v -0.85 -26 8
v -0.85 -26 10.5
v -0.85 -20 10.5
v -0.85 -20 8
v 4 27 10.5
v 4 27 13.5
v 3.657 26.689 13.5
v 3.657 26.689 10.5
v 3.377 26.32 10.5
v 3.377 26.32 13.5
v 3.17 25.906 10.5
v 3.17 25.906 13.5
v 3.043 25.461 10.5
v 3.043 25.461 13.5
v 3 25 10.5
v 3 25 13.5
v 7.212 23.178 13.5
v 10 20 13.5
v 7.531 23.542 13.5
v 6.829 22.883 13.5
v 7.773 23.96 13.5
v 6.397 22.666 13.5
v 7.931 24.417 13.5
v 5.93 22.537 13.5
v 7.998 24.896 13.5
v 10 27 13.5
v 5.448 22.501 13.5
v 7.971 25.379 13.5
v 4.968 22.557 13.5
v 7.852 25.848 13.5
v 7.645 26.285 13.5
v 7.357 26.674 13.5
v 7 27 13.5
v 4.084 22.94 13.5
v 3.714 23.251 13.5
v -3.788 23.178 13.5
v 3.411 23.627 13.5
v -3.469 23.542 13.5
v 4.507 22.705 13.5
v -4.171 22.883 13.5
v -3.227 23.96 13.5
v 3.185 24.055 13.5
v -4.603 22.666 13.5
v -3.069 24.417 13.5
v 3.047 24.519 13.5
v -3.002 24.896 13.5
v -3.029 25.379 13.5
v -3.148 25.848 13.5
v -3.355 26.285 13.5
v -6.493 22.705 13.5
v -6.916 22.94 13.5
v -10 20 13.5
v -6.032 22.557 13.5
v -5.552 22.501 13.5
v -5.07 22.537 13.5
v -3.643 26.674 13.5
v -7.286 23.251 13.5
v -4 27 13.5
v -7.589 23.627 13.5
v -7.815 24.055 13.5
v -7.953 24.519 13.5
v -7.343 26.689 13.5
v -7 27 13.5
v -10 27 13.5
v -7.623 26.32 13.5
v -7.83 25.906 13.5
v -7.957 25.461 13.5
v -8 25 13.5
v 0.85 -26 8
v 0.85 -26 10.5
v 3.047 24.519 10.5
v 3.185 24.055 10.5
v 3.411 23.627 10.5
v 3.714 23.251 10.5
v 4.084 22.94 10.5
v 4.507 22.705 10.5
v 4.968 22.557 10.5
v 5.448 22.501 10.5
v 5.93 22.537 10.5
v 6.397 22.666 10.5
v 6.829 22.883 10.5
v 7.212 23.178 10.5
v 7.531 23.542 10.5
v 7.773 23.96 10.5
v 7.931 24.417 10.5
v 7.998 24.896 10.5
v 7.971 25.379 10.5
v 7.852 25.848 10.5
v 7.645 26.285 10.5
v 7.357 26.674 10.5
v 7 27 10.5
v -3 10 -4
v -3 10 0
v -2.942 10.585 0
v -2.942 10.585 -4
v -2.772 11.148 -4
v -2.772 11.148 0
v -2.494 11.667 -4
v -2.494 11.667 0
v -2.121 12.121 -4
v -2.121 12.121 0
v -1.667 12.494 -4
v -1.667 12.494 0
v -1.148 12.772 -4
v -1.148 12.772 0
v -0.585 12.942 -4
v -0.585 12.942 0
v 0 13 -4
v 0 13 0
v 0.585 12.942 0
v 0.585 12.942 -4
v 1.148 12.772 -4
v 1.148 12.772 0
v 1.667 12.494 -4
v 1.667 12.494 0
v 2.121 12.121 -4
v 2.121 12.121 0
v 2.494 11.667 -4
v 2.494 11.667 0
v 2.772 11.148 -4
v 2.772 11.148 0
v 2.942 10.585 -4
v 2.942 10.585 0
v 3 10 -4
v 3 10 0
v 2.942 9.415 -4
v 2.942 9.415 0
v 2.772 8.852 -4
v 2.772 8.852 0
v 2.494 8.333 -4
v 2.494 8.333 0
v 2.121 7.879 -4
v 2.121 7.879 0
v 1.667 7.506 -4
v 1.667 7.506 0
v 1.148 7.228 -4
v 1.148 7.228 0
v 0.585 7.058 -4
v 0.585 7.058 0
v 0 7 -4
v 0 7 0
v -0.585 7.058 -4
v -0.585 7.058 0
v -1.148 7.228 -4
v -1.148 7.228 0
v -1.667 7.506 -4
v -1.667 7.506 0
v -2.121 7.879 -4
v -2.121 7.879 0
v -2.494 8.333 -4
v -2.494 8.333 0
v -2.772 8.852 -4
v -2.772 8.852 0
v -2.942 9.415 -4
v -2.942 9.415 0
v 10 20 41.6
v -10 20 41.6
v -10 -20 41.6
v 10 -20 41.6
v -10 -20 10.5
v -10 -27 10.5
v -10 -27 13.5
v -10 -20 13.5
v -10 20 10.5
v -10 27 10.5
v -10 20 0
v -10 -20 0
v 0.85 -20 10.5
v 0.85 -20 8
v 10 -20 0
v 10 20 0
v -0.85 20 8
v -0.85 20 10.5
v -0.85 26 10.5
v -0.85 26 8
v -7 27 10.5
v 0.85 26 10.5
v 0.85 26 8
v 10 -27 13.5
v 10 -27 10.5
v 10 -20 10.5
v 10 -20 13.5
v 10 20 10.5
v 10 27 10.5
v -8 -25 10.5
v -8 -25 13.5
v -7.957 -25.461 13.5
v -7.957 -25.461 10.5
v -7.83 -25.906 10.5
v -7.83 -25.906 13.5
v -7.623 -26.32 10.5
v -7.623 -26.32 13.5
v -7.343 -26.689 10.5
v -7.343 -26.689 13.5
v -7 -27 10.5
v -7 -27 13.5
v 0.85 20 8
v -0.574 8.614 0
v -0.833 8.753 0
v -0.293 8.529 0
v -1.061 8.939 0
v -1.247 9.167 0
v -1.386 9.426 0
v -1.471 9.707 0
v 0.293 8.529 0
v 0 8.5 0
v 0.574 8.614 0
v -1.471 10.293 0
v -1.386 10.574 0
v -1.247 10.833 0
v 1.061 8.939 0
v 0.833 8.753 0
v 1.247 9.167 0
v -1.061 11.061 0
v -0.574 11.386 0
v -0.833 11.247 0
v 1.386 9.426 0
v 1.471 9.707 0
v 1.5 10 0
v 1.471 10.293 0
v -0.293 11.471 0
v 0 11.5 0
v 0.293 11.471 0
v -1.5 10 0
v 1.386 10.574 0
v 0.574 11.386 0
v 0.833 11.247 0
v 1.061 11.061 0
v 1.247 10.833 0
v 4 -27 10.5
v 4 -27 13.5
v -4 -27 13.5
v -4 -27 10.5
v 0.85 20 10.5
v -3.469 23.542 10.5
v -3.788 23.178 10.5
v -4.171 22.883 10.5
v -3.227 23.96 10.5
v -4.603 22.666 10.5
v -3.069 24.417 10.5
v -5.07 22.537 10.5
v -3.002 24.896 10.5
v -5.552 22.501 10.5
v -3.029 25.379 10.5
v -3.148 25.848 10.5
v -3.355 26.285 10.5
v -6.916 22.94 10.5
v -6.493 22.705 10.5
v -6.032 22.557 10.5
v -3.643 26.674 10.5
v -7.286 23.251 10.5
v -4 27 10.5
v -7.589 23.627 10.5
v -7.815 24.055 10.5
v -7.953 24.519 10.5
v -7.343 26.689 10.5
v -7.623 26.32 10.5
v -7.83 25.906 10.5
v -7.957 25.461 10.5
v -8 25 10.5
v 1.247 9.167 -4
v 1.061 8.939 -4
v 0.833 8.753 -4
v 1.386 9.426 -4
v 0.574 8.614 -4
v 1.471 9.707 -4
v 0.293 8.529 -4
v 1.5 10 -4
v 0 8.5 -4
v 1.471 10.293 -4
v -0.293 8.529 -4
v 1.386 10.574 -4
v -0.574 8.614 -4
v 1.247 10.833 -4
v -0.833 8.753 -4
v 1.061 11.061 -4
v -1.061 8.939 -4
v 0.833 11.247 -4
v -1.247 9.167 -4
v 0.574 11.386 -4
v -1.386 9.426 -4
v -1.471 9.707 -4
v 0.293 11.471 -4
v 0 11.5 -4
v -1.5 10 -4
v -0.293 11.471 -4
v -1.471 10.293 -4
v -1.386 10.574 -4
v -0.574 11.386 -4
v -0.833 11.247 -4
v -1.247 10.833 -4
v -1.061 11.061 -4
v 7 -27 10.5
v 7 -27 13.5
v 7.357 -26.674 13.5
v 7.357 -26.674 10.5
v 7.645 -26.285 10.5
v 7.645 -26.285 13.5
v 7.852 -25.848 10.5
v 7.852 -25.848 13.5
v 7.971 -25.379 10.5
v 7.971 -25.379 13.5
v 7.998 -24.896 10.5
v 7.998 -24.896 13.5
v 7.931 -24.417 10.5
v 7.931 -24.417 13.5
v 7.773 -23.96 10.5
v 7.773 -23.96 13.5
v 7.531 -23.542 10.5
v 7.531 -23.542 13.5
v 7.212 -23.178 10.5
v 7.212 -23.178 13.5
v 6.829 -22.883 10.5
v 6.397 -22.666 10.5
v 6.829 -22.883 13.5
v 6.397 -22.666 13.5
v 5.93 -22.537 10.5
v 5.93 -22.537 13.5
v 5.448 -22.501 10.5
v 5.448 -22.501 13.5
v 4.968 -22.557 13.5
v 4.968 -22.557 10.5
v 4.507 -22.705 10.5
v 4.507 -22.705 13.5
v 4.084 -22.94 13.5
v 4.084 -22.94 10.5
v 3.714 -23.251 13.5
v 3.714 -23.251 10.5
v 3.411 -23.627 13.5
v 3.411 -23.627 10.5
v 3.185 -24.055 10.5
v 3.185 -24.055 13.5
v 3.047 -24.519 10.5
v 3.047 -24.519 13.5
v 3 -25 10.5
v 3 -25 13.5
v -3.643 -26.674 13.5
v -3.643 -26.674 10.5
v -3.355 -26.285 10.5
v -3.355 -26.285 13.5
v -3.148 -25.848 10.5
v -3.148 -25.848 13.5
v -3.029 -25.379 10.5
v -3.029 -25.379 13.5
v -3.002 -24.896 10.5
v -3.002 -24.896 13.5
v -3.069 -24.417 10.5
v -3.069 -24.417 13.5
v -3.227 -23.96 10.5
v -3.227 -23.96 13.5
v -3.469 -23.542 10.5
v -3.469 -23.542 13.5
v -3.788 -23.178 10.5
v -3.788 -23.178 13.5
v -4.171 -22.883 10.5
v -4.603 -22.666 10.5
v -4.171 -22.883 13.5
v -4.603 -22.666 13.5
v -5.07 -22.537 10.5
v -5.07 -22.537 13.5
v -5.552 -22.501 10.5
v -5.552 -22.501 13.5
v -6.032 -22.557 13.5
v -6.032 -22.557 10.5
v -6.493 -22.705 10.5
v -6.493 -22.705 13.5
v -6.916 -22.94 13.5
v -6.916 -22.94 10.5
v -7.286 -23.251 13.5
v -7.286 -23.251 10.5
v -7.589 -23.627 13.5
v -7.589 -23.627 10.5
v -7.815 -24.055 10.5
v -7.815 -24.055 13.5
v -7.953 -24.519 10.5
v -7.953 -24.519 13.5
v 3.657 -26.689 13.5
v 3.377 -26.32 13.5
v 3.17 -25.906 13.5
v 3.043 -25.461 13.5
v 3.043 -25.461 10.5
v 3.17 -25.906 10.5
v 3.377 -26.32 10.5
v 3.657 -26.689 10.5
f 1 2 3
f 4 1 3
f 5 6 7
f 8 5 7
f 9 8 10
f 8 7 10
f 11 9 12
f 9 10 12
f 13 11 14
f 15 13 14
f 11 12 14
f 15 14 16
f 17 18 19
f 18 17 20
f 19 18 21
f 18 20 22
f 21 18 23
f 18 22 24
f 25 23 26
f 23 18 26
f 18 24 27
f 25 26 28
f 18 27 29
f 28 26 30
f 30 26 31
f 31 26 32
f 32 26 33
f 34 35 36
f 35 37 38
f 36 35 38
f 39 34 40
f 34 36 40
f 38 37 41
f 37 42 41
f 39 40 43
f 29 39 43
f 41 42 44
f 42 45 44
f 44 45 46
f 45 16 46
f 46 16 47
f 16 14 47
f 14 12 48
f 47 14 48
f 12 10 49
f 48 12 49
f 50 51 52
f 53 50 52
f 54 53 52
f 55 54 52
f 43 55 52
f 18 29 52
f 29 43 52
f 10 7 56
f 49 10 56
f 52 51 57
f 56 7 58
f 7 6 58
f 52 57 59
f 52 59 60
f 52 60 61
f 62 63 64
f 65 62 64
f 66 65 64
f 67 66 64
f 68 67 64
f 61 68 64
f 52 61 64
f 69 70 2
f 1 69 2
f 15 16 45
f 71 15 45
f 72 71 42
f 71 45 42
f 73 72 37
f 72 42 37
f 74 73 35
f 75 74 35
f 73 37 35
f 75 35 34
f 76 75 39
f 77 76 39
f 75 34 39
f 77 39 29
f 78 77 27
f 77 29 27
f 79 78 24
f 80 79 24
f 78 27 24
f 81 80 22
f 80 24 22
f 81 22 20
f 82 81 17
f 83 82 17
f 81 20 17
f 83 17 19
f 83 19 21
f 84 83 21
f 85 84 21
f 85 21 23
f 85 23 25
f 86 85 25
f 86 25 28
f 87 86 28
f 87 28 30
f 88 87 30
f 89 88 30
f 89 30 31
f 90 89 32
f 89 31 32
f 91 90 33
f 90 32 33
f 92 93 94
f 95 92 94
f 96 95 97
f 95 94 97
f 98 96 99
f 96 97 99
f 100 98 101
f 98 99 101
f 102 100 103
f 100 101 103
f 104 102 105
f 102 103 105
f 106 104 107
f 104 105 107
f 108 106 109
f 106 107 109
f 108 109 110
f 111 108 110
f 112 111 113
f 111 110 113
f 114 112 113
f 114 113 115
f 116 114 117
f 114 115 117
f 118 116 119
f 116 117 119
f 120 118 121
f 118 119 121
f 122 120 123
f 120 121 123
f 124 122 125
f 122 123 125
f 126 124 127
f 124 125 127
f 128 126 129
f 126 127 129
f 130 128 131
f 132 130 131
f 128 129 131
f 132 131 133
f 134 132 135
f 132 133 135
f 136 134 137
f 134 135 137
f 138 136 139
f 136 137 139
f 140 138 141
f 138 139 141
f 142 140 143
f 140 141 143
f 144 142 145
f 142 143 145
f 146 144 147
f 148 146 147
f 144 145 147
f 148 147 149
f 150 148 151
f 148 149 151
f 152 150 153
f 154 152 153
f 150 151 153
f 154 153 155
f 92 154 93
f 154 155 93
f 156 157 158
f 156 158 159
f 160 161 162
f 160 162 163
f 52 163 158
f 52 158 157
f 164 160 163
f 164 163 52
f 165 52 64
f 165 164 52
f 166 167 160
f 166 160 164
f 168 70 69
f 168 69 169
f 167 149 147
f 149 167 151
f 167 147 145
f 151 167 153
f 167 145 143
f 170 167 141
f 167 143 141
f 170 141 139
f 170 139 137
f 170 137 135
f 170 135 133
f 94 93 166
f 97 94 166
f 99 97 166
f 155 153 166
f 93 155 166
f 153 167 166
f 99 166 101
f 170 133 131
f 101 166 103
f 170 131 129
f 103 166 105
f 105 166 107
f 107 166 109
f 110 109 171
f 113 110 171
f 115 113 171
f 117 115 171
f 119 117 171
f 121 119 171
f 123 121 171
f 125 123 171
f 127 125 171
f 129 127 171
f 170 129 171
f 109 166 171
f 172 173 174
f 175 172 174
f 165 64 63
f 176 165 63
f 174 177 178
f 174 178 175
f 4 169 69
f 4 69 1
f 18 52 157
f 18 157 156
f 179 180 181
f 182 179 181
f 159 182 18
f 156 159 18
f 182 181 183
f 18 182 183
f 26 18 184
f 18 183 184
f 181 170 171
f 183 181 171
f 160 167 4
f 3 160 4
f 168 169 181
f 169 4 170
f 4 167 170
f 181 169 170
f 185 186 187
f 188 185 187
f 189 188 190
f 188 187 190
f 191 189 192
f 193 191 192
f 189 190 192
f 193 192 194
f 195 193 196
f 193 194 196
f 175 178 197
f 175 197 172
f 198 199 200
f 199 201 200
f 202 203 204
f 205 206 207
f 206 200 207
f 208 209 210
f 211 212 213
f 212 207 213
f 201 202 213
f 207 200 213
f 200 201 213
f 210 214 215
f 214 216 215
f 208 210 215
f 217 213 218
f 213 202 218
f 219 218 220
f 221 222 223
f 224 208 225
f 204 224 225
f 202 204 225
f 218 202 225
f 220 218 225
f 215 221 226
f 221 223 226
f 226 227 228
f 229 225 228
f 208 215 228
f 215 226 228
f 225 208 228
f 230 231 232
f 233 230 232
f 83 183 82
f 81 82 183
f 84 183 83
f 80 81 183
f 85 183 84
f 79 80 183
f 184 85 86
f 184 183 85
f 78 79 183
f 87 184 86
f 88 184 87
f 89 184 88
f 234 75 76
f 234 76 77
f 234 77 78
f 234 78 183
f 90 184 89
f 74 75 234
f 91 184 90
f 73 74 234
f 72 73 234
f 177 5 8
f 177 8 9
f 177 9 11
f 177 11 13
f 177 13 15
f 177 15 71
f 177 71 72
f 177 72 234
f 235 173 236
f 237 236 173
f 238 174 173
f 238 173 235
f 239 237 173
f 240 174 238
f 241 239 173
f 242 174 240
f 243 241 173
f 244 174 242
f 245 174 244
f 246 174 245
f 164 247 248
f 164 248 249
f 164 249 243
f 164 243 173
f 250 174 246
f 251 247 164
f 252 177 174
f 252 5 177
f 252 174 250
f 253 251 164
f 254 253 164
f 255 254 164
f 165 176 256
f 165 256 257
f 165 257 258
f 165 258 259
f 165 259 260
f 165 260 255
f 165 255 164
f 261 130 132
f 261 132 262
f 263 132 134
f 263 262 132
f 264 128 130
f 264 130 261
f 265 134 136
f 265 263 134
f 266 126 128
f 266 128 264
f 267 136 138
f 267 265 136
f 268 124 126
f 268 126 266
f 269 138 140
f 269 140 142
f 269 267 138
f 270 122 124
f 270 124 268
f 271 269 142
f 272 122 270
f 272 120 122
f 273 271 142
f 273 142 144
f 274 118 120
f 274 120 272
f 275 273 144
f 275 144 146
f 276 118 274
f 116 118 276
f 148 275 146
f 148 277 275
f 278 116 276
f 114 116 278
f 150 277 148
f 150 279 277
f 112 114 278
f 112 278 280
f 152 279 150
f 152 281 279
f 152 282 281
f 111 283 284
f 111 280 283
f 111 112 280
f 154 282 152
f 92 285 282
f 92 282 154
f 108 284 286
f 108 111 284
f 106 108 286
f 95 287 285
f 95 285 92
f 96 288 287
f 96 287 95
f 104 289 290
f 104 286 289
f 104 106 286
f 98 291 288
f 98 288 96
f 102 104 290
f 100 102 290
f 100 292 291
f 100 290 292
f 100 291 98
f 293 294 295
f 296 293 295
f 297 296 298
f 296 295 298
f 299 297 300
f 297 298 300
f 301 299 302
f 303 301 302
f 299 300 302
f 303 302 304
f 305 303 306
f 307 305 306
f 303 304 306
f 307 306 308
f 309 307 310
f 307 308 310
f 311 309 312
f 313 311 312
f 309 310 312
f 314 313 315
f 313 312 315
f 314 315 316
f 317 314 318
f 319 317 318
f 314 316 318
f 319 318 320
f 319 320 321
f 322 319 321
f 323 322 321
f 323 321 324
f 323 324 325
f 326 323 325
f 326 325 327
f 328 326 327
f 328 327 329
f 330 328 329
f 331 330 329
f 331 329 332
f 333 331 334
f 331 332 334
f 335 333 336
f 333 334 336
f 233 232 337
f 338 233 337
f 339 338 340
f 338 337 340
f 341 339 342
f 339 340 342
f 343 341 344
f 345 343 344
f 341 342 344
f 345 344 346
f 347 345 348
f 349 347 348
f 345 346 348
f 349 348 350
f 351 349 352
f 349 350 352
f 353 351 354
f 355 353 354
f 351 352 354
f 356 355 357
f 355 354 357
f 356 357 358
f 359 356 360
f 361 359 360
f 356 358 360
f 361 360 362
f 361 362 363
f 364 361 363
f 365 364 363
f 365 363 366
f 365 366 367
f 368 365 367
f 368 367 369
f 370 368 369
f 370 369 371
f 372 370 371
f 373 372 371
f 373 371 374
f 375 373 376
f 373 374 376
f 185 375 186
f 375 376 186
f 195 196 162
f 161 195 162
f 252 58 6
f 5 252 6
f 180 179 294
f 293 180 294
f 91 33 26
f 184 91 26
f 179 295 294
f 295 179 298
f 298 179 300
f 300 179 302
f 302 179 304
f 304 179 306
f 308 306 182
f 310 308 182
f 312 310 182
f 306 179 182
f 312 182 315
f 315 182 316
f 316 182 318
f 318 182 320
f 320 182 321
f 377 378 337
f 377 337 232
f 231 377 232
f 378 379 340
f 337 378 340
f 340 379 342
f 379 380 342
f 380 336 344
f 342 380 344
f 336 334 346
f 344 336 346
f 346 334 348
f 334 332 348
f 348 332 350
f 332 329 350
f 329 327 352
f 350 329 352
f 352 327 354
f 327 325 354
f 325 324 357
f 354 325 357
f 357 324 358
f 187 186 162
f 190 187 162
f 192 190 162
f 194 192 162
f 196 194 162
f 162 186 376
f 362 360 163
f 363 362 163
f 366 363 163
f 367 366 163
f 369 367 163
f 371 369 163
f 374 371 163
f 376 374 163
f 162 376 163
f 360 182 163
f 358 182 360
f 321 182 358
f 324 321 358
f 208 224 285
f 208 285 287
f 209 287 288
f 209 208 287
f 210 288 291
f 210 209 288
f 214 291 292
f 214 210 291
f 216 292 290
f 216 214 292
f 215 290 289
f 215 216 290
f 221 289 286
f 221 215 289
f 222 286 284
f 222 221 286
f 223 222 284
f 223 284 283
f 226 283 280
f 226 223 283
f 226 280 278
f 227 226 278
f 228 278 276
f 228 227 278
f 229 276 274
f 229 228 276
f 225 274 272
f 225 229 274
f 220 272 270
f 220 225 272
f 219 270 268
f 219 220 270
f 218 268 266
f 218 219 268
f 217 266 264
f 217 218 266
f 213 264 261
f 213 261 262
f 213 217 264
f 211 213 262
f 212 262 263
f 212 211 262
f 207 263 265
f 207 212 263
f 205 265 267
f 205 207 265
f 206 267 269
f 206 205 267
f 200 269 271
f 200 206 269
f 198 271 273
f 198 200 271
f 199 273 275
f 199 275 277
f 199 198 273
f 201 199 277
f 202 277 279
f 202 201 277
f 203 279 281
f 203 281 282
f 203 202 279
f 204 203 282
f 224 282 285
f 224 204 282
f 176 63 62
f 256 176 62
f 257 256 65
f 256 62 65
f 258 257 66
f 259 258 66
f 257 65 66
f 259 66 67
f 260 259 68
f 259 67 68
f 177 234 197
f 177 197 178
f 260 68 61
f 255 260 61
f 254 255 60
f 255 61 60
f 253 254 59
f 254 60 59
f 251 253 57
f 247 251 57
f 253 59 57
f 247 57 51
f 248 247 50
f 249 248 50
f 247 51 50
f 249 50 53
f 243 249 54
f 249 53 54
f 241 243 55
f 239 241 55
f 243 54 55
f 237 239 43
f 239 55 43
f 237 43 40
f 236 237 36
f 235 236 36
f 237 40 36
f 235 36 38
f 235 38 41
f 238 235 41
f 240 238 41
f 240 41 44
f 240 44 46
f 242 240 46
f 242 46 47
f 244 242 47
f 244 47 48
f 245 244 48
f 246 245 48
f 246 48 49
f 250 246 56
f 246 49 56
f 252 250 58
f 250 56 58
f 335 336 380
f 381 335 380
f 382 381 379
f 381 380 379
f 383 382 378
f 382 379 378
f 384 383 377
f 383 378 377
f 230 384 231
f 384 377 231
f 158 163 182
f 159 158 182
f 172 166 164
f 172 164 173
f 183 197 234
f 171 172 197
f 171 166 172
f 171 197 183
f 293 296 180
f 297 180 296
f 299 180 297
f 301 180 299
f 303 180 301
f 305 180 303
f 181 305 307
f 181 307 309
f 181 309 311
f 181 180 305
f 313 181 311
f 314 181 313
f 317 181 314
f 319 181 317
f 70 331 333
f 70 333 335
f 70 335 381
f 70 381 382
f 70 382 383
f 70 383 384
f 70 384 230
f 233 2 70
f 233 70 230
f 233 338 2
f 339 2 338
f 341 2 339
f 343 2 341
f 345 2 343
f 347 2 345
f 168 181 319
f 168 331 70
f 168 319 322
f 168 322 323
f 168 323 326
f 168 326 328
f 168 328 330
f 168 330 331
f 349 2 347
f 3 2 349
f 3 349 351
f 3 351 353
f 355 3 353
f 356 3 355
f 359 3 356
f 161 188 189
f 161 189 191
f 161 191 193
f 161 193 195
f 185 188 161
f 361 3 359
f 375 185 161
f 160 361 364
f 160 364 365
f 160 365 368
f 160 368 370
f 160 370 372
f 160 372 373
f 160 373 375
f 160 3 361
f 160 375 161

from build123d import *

# Parameters (mm, degrees)
SKETCH1_W           = 20
SKETCH1_H           = 40
BOSS_EXTRUDE1_DEPTH = 41.6
SKETCH2_R           = 3
SKETCH2_R_2         = 1.5
BOSS_EXTRUDE2_DEPTH = 4
BOSS_EXTRUDE3_START = -13.5
BOSS_EXTRUDE3_DEPTH = 3
SKETCH5_W           = 1.7
SKETCH5_H           = 6
BOSS_EXTRUDE4_DEPTH = 2.5


with BuildPart() as part:
    # Sketch1 → Boss-Extrude1 (new body)
    with BuildSketch(Plane.XY):
        Rectangle(SKETCH1_W, SKETCH1_H)
    extrude(amount=BOSS_EXTRUDE1_DEPTH)

    # Sketch2 → Boss-Extrude2 (add)
    with BuildSketch(Plane(origin=(0, 0, 0), x_dir=(-1, 0, 0), z_dir=(0, 0, -1))):
        with Locations((0, 10)):
            Circle(SKETCH2_R)
        with Locations((0, 10)):
            Circle(SKETCH2_R_2, mode=Mode.SUBTRACT)
    extrude(amount=BOSS_EXTRUDE2_DEPTH)

    # Sketch3 → Boss-Extrude3 (add)
    with BuildSketch(Plane(origin=(0, 0, 0), x_dir=(-1, 0, 0), z_dir=(0, 0, -1)).offset(BOSS_EXTRUDE3_START)):
        with BuildLine():
            Line((-10, 27), (-10, 20))
            Line((-10, 20), (10, 20))
            Line((10, 20), (10, 27))
            Line((10, 27), (7, 27))
            ThreePointArc((7, 27), (7.736067977, 26.118033989), (8, 25))
            ThreePointArc((8, 25), (4.381966011, 22.763932023), (4, 27))
            Line((4, 27), (-4, 27))
            ThreePointArc((-4, 27), (-3.263932023, 26.118033989), (-3, 25))
            ThreePointArc((-3, 25), (-6.618033989, 22.763932023), (-7, 27))
            Line((-7, 27), (-10, 27))
        make_face()
        with BuildLine():
            Line((10, -20), (-10, -20))
            Line((-10, -20), (-10, -27))
            Line((-10, -27), (-7, -27))
            ThreePointArc((-7, -27), (-6.618033989, -22.763932023), (-3, -25))
            ThreePointArc((-3, -25), (-3.263932023, -26.118033989), (-4, -27))
            Line((-4, -27), (4, -27))
            ThreePointArc((4, -27), (4.381966011, -22.763932023), (8, -25))
            ThreePointArc((8, -25), (7.736067977, -26.118033989), (7, -27))
            Line((7, -27), (10, -27))
            Line((10, -27), (10, -20))
        make_face()
    extrude(amount=BOSS_EXTRUDE3_DEPTH)

    # Sketch5 → Boss-Extrude4 (add)
    with BuildSketch(Plane(origin=(0, 0, 10.5), x_dir=(-1, 0, 0), z_dir=(0, 0, -1))):
        with Locations((0, 23)):
            Rectangle(SKETCH5_W, SKETCH5_H)
        with Locations((0, -23)):
            Rectangle(SKETCH5_W, SKETCH5_H)
    extrude(amount=BOSS_EXTRUDE4_DEPTH)


solid = part.part
